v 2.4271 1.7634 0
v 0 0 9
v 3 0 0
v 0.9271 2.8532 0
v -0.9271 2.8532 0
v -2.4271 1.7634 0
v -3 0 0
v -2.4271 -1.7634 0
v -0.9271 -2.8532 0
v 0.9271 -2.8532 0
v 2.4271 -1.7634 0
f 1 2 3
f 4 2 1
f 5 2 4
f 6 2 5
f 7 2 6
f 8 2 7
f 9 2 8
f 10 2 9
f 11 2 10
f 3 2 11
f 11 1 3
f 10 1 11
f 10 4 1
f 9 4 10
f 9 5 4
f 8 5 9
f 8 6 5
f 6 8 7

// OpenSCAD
// Generated by SolidPython 1.0.1 on 2020-07-29 00:46:43


cylinder(h = 9, r1 = 3, r2 = 0);
/***********************************************
*********      SolidPython code:      **********
************************************************
 
# import packages: SolidPython
from solid import *
from solid.utils import *
from itertools import chain, combinations, permutations


class Resize:

    def __init__(self, scad_file):
        self.scad_file = scad_file
        #self.scad_file = import_scad(scad_file)
        # cone/cylinder param:
        self.r1 = 0
        self.r2 = 0
        self.h = 0
        # rectangular prism param:
        self.w = 0
        self.l = 0
        # ellipse param:
        self.r = 0

    # import OpenScad code (file name corresponds to shape)


    # classify shape + parameters
    def assign(self, param1, param2, param3):
        if self.scad_file == 'cone.scad':
            self.r1 = param1
            self.r2 = param2
            self.h = param3
        elif self.scad_file == 'cylinder.scad':
            self.r1 = param1
            self.r2 = param2
            self.h = param3
        elif self.scad_file == 'rectangularPrism.scad':
            self.h = param1
            self.l = param2
            self.w = param3
        else:
            self.r = param1
            self.h = param2

    # resize parameters
    def iterate(self):
        x = range(3, 20, 2)
        i = 1
        if self.scad_file == 'cone.scad':
            tempList = list(permutations(x, 2))
            for temp in tempList:
                param1 = temp[0]
                param2 = temp[1]
                filepath = 'produced_scad_files/' + 'cone' + str(param1) + '_' + str(param2) + '_' + '.scad'
                scad_render_to_file(cylinder(h=param1, r1=param2, r2=0), filepath)

        elif self.scad_file == 'cylinder.scad':
            tempList = list(permutations(x, 3))
            for temp in tempList:
                param1 = temp[0]
                param2 = temp[1]
                filepath = 'produced_scad_files/' + 'cylinder' + str(param1) + '_' + str(param2) + '_' + '.scad'
                scad_render_to_file(cylinder(h=param1, r1=param2, r2=param2), filepath)

        elif self.scad_file == 'rectangularPrism.scad':
            tempList = list(permutations(x, 3))
            for temp in tempList:
                param1 = temp[0]
                param2 = temp[1]
                param3 = temp[2]
                filepath = 'produced_scad_files/' + 'rectangularPrism' + str(param1) + '_' + str(param2) + '_' + str(
                    param3) + '.scad'
                scad_render_to_file(cube(size=(param1, param2, param3)), filepath)

        elif self.scad_file == 'ellipse.scad':
            tempList = list(permutations(x, 4))
            for temp in tempList:
                param1 = temp[0]
                param2 = temp[1]
                param3 = temp[2]
                param4 = temp[3]
                filepath = 'produced_scad_files/' + 'ellipse' + str(param1) + '_' + str(param2) + '_' + str(param3) + '_' + str(param4) + '.scad'
                scad_render_to_file(scale([param1, param2, param3])(sphere(r=param4)), filepath)

    def render_to_scadfile(self):
        scad_render_to_file(scad, 'example.scad') 
 
************************************************/
